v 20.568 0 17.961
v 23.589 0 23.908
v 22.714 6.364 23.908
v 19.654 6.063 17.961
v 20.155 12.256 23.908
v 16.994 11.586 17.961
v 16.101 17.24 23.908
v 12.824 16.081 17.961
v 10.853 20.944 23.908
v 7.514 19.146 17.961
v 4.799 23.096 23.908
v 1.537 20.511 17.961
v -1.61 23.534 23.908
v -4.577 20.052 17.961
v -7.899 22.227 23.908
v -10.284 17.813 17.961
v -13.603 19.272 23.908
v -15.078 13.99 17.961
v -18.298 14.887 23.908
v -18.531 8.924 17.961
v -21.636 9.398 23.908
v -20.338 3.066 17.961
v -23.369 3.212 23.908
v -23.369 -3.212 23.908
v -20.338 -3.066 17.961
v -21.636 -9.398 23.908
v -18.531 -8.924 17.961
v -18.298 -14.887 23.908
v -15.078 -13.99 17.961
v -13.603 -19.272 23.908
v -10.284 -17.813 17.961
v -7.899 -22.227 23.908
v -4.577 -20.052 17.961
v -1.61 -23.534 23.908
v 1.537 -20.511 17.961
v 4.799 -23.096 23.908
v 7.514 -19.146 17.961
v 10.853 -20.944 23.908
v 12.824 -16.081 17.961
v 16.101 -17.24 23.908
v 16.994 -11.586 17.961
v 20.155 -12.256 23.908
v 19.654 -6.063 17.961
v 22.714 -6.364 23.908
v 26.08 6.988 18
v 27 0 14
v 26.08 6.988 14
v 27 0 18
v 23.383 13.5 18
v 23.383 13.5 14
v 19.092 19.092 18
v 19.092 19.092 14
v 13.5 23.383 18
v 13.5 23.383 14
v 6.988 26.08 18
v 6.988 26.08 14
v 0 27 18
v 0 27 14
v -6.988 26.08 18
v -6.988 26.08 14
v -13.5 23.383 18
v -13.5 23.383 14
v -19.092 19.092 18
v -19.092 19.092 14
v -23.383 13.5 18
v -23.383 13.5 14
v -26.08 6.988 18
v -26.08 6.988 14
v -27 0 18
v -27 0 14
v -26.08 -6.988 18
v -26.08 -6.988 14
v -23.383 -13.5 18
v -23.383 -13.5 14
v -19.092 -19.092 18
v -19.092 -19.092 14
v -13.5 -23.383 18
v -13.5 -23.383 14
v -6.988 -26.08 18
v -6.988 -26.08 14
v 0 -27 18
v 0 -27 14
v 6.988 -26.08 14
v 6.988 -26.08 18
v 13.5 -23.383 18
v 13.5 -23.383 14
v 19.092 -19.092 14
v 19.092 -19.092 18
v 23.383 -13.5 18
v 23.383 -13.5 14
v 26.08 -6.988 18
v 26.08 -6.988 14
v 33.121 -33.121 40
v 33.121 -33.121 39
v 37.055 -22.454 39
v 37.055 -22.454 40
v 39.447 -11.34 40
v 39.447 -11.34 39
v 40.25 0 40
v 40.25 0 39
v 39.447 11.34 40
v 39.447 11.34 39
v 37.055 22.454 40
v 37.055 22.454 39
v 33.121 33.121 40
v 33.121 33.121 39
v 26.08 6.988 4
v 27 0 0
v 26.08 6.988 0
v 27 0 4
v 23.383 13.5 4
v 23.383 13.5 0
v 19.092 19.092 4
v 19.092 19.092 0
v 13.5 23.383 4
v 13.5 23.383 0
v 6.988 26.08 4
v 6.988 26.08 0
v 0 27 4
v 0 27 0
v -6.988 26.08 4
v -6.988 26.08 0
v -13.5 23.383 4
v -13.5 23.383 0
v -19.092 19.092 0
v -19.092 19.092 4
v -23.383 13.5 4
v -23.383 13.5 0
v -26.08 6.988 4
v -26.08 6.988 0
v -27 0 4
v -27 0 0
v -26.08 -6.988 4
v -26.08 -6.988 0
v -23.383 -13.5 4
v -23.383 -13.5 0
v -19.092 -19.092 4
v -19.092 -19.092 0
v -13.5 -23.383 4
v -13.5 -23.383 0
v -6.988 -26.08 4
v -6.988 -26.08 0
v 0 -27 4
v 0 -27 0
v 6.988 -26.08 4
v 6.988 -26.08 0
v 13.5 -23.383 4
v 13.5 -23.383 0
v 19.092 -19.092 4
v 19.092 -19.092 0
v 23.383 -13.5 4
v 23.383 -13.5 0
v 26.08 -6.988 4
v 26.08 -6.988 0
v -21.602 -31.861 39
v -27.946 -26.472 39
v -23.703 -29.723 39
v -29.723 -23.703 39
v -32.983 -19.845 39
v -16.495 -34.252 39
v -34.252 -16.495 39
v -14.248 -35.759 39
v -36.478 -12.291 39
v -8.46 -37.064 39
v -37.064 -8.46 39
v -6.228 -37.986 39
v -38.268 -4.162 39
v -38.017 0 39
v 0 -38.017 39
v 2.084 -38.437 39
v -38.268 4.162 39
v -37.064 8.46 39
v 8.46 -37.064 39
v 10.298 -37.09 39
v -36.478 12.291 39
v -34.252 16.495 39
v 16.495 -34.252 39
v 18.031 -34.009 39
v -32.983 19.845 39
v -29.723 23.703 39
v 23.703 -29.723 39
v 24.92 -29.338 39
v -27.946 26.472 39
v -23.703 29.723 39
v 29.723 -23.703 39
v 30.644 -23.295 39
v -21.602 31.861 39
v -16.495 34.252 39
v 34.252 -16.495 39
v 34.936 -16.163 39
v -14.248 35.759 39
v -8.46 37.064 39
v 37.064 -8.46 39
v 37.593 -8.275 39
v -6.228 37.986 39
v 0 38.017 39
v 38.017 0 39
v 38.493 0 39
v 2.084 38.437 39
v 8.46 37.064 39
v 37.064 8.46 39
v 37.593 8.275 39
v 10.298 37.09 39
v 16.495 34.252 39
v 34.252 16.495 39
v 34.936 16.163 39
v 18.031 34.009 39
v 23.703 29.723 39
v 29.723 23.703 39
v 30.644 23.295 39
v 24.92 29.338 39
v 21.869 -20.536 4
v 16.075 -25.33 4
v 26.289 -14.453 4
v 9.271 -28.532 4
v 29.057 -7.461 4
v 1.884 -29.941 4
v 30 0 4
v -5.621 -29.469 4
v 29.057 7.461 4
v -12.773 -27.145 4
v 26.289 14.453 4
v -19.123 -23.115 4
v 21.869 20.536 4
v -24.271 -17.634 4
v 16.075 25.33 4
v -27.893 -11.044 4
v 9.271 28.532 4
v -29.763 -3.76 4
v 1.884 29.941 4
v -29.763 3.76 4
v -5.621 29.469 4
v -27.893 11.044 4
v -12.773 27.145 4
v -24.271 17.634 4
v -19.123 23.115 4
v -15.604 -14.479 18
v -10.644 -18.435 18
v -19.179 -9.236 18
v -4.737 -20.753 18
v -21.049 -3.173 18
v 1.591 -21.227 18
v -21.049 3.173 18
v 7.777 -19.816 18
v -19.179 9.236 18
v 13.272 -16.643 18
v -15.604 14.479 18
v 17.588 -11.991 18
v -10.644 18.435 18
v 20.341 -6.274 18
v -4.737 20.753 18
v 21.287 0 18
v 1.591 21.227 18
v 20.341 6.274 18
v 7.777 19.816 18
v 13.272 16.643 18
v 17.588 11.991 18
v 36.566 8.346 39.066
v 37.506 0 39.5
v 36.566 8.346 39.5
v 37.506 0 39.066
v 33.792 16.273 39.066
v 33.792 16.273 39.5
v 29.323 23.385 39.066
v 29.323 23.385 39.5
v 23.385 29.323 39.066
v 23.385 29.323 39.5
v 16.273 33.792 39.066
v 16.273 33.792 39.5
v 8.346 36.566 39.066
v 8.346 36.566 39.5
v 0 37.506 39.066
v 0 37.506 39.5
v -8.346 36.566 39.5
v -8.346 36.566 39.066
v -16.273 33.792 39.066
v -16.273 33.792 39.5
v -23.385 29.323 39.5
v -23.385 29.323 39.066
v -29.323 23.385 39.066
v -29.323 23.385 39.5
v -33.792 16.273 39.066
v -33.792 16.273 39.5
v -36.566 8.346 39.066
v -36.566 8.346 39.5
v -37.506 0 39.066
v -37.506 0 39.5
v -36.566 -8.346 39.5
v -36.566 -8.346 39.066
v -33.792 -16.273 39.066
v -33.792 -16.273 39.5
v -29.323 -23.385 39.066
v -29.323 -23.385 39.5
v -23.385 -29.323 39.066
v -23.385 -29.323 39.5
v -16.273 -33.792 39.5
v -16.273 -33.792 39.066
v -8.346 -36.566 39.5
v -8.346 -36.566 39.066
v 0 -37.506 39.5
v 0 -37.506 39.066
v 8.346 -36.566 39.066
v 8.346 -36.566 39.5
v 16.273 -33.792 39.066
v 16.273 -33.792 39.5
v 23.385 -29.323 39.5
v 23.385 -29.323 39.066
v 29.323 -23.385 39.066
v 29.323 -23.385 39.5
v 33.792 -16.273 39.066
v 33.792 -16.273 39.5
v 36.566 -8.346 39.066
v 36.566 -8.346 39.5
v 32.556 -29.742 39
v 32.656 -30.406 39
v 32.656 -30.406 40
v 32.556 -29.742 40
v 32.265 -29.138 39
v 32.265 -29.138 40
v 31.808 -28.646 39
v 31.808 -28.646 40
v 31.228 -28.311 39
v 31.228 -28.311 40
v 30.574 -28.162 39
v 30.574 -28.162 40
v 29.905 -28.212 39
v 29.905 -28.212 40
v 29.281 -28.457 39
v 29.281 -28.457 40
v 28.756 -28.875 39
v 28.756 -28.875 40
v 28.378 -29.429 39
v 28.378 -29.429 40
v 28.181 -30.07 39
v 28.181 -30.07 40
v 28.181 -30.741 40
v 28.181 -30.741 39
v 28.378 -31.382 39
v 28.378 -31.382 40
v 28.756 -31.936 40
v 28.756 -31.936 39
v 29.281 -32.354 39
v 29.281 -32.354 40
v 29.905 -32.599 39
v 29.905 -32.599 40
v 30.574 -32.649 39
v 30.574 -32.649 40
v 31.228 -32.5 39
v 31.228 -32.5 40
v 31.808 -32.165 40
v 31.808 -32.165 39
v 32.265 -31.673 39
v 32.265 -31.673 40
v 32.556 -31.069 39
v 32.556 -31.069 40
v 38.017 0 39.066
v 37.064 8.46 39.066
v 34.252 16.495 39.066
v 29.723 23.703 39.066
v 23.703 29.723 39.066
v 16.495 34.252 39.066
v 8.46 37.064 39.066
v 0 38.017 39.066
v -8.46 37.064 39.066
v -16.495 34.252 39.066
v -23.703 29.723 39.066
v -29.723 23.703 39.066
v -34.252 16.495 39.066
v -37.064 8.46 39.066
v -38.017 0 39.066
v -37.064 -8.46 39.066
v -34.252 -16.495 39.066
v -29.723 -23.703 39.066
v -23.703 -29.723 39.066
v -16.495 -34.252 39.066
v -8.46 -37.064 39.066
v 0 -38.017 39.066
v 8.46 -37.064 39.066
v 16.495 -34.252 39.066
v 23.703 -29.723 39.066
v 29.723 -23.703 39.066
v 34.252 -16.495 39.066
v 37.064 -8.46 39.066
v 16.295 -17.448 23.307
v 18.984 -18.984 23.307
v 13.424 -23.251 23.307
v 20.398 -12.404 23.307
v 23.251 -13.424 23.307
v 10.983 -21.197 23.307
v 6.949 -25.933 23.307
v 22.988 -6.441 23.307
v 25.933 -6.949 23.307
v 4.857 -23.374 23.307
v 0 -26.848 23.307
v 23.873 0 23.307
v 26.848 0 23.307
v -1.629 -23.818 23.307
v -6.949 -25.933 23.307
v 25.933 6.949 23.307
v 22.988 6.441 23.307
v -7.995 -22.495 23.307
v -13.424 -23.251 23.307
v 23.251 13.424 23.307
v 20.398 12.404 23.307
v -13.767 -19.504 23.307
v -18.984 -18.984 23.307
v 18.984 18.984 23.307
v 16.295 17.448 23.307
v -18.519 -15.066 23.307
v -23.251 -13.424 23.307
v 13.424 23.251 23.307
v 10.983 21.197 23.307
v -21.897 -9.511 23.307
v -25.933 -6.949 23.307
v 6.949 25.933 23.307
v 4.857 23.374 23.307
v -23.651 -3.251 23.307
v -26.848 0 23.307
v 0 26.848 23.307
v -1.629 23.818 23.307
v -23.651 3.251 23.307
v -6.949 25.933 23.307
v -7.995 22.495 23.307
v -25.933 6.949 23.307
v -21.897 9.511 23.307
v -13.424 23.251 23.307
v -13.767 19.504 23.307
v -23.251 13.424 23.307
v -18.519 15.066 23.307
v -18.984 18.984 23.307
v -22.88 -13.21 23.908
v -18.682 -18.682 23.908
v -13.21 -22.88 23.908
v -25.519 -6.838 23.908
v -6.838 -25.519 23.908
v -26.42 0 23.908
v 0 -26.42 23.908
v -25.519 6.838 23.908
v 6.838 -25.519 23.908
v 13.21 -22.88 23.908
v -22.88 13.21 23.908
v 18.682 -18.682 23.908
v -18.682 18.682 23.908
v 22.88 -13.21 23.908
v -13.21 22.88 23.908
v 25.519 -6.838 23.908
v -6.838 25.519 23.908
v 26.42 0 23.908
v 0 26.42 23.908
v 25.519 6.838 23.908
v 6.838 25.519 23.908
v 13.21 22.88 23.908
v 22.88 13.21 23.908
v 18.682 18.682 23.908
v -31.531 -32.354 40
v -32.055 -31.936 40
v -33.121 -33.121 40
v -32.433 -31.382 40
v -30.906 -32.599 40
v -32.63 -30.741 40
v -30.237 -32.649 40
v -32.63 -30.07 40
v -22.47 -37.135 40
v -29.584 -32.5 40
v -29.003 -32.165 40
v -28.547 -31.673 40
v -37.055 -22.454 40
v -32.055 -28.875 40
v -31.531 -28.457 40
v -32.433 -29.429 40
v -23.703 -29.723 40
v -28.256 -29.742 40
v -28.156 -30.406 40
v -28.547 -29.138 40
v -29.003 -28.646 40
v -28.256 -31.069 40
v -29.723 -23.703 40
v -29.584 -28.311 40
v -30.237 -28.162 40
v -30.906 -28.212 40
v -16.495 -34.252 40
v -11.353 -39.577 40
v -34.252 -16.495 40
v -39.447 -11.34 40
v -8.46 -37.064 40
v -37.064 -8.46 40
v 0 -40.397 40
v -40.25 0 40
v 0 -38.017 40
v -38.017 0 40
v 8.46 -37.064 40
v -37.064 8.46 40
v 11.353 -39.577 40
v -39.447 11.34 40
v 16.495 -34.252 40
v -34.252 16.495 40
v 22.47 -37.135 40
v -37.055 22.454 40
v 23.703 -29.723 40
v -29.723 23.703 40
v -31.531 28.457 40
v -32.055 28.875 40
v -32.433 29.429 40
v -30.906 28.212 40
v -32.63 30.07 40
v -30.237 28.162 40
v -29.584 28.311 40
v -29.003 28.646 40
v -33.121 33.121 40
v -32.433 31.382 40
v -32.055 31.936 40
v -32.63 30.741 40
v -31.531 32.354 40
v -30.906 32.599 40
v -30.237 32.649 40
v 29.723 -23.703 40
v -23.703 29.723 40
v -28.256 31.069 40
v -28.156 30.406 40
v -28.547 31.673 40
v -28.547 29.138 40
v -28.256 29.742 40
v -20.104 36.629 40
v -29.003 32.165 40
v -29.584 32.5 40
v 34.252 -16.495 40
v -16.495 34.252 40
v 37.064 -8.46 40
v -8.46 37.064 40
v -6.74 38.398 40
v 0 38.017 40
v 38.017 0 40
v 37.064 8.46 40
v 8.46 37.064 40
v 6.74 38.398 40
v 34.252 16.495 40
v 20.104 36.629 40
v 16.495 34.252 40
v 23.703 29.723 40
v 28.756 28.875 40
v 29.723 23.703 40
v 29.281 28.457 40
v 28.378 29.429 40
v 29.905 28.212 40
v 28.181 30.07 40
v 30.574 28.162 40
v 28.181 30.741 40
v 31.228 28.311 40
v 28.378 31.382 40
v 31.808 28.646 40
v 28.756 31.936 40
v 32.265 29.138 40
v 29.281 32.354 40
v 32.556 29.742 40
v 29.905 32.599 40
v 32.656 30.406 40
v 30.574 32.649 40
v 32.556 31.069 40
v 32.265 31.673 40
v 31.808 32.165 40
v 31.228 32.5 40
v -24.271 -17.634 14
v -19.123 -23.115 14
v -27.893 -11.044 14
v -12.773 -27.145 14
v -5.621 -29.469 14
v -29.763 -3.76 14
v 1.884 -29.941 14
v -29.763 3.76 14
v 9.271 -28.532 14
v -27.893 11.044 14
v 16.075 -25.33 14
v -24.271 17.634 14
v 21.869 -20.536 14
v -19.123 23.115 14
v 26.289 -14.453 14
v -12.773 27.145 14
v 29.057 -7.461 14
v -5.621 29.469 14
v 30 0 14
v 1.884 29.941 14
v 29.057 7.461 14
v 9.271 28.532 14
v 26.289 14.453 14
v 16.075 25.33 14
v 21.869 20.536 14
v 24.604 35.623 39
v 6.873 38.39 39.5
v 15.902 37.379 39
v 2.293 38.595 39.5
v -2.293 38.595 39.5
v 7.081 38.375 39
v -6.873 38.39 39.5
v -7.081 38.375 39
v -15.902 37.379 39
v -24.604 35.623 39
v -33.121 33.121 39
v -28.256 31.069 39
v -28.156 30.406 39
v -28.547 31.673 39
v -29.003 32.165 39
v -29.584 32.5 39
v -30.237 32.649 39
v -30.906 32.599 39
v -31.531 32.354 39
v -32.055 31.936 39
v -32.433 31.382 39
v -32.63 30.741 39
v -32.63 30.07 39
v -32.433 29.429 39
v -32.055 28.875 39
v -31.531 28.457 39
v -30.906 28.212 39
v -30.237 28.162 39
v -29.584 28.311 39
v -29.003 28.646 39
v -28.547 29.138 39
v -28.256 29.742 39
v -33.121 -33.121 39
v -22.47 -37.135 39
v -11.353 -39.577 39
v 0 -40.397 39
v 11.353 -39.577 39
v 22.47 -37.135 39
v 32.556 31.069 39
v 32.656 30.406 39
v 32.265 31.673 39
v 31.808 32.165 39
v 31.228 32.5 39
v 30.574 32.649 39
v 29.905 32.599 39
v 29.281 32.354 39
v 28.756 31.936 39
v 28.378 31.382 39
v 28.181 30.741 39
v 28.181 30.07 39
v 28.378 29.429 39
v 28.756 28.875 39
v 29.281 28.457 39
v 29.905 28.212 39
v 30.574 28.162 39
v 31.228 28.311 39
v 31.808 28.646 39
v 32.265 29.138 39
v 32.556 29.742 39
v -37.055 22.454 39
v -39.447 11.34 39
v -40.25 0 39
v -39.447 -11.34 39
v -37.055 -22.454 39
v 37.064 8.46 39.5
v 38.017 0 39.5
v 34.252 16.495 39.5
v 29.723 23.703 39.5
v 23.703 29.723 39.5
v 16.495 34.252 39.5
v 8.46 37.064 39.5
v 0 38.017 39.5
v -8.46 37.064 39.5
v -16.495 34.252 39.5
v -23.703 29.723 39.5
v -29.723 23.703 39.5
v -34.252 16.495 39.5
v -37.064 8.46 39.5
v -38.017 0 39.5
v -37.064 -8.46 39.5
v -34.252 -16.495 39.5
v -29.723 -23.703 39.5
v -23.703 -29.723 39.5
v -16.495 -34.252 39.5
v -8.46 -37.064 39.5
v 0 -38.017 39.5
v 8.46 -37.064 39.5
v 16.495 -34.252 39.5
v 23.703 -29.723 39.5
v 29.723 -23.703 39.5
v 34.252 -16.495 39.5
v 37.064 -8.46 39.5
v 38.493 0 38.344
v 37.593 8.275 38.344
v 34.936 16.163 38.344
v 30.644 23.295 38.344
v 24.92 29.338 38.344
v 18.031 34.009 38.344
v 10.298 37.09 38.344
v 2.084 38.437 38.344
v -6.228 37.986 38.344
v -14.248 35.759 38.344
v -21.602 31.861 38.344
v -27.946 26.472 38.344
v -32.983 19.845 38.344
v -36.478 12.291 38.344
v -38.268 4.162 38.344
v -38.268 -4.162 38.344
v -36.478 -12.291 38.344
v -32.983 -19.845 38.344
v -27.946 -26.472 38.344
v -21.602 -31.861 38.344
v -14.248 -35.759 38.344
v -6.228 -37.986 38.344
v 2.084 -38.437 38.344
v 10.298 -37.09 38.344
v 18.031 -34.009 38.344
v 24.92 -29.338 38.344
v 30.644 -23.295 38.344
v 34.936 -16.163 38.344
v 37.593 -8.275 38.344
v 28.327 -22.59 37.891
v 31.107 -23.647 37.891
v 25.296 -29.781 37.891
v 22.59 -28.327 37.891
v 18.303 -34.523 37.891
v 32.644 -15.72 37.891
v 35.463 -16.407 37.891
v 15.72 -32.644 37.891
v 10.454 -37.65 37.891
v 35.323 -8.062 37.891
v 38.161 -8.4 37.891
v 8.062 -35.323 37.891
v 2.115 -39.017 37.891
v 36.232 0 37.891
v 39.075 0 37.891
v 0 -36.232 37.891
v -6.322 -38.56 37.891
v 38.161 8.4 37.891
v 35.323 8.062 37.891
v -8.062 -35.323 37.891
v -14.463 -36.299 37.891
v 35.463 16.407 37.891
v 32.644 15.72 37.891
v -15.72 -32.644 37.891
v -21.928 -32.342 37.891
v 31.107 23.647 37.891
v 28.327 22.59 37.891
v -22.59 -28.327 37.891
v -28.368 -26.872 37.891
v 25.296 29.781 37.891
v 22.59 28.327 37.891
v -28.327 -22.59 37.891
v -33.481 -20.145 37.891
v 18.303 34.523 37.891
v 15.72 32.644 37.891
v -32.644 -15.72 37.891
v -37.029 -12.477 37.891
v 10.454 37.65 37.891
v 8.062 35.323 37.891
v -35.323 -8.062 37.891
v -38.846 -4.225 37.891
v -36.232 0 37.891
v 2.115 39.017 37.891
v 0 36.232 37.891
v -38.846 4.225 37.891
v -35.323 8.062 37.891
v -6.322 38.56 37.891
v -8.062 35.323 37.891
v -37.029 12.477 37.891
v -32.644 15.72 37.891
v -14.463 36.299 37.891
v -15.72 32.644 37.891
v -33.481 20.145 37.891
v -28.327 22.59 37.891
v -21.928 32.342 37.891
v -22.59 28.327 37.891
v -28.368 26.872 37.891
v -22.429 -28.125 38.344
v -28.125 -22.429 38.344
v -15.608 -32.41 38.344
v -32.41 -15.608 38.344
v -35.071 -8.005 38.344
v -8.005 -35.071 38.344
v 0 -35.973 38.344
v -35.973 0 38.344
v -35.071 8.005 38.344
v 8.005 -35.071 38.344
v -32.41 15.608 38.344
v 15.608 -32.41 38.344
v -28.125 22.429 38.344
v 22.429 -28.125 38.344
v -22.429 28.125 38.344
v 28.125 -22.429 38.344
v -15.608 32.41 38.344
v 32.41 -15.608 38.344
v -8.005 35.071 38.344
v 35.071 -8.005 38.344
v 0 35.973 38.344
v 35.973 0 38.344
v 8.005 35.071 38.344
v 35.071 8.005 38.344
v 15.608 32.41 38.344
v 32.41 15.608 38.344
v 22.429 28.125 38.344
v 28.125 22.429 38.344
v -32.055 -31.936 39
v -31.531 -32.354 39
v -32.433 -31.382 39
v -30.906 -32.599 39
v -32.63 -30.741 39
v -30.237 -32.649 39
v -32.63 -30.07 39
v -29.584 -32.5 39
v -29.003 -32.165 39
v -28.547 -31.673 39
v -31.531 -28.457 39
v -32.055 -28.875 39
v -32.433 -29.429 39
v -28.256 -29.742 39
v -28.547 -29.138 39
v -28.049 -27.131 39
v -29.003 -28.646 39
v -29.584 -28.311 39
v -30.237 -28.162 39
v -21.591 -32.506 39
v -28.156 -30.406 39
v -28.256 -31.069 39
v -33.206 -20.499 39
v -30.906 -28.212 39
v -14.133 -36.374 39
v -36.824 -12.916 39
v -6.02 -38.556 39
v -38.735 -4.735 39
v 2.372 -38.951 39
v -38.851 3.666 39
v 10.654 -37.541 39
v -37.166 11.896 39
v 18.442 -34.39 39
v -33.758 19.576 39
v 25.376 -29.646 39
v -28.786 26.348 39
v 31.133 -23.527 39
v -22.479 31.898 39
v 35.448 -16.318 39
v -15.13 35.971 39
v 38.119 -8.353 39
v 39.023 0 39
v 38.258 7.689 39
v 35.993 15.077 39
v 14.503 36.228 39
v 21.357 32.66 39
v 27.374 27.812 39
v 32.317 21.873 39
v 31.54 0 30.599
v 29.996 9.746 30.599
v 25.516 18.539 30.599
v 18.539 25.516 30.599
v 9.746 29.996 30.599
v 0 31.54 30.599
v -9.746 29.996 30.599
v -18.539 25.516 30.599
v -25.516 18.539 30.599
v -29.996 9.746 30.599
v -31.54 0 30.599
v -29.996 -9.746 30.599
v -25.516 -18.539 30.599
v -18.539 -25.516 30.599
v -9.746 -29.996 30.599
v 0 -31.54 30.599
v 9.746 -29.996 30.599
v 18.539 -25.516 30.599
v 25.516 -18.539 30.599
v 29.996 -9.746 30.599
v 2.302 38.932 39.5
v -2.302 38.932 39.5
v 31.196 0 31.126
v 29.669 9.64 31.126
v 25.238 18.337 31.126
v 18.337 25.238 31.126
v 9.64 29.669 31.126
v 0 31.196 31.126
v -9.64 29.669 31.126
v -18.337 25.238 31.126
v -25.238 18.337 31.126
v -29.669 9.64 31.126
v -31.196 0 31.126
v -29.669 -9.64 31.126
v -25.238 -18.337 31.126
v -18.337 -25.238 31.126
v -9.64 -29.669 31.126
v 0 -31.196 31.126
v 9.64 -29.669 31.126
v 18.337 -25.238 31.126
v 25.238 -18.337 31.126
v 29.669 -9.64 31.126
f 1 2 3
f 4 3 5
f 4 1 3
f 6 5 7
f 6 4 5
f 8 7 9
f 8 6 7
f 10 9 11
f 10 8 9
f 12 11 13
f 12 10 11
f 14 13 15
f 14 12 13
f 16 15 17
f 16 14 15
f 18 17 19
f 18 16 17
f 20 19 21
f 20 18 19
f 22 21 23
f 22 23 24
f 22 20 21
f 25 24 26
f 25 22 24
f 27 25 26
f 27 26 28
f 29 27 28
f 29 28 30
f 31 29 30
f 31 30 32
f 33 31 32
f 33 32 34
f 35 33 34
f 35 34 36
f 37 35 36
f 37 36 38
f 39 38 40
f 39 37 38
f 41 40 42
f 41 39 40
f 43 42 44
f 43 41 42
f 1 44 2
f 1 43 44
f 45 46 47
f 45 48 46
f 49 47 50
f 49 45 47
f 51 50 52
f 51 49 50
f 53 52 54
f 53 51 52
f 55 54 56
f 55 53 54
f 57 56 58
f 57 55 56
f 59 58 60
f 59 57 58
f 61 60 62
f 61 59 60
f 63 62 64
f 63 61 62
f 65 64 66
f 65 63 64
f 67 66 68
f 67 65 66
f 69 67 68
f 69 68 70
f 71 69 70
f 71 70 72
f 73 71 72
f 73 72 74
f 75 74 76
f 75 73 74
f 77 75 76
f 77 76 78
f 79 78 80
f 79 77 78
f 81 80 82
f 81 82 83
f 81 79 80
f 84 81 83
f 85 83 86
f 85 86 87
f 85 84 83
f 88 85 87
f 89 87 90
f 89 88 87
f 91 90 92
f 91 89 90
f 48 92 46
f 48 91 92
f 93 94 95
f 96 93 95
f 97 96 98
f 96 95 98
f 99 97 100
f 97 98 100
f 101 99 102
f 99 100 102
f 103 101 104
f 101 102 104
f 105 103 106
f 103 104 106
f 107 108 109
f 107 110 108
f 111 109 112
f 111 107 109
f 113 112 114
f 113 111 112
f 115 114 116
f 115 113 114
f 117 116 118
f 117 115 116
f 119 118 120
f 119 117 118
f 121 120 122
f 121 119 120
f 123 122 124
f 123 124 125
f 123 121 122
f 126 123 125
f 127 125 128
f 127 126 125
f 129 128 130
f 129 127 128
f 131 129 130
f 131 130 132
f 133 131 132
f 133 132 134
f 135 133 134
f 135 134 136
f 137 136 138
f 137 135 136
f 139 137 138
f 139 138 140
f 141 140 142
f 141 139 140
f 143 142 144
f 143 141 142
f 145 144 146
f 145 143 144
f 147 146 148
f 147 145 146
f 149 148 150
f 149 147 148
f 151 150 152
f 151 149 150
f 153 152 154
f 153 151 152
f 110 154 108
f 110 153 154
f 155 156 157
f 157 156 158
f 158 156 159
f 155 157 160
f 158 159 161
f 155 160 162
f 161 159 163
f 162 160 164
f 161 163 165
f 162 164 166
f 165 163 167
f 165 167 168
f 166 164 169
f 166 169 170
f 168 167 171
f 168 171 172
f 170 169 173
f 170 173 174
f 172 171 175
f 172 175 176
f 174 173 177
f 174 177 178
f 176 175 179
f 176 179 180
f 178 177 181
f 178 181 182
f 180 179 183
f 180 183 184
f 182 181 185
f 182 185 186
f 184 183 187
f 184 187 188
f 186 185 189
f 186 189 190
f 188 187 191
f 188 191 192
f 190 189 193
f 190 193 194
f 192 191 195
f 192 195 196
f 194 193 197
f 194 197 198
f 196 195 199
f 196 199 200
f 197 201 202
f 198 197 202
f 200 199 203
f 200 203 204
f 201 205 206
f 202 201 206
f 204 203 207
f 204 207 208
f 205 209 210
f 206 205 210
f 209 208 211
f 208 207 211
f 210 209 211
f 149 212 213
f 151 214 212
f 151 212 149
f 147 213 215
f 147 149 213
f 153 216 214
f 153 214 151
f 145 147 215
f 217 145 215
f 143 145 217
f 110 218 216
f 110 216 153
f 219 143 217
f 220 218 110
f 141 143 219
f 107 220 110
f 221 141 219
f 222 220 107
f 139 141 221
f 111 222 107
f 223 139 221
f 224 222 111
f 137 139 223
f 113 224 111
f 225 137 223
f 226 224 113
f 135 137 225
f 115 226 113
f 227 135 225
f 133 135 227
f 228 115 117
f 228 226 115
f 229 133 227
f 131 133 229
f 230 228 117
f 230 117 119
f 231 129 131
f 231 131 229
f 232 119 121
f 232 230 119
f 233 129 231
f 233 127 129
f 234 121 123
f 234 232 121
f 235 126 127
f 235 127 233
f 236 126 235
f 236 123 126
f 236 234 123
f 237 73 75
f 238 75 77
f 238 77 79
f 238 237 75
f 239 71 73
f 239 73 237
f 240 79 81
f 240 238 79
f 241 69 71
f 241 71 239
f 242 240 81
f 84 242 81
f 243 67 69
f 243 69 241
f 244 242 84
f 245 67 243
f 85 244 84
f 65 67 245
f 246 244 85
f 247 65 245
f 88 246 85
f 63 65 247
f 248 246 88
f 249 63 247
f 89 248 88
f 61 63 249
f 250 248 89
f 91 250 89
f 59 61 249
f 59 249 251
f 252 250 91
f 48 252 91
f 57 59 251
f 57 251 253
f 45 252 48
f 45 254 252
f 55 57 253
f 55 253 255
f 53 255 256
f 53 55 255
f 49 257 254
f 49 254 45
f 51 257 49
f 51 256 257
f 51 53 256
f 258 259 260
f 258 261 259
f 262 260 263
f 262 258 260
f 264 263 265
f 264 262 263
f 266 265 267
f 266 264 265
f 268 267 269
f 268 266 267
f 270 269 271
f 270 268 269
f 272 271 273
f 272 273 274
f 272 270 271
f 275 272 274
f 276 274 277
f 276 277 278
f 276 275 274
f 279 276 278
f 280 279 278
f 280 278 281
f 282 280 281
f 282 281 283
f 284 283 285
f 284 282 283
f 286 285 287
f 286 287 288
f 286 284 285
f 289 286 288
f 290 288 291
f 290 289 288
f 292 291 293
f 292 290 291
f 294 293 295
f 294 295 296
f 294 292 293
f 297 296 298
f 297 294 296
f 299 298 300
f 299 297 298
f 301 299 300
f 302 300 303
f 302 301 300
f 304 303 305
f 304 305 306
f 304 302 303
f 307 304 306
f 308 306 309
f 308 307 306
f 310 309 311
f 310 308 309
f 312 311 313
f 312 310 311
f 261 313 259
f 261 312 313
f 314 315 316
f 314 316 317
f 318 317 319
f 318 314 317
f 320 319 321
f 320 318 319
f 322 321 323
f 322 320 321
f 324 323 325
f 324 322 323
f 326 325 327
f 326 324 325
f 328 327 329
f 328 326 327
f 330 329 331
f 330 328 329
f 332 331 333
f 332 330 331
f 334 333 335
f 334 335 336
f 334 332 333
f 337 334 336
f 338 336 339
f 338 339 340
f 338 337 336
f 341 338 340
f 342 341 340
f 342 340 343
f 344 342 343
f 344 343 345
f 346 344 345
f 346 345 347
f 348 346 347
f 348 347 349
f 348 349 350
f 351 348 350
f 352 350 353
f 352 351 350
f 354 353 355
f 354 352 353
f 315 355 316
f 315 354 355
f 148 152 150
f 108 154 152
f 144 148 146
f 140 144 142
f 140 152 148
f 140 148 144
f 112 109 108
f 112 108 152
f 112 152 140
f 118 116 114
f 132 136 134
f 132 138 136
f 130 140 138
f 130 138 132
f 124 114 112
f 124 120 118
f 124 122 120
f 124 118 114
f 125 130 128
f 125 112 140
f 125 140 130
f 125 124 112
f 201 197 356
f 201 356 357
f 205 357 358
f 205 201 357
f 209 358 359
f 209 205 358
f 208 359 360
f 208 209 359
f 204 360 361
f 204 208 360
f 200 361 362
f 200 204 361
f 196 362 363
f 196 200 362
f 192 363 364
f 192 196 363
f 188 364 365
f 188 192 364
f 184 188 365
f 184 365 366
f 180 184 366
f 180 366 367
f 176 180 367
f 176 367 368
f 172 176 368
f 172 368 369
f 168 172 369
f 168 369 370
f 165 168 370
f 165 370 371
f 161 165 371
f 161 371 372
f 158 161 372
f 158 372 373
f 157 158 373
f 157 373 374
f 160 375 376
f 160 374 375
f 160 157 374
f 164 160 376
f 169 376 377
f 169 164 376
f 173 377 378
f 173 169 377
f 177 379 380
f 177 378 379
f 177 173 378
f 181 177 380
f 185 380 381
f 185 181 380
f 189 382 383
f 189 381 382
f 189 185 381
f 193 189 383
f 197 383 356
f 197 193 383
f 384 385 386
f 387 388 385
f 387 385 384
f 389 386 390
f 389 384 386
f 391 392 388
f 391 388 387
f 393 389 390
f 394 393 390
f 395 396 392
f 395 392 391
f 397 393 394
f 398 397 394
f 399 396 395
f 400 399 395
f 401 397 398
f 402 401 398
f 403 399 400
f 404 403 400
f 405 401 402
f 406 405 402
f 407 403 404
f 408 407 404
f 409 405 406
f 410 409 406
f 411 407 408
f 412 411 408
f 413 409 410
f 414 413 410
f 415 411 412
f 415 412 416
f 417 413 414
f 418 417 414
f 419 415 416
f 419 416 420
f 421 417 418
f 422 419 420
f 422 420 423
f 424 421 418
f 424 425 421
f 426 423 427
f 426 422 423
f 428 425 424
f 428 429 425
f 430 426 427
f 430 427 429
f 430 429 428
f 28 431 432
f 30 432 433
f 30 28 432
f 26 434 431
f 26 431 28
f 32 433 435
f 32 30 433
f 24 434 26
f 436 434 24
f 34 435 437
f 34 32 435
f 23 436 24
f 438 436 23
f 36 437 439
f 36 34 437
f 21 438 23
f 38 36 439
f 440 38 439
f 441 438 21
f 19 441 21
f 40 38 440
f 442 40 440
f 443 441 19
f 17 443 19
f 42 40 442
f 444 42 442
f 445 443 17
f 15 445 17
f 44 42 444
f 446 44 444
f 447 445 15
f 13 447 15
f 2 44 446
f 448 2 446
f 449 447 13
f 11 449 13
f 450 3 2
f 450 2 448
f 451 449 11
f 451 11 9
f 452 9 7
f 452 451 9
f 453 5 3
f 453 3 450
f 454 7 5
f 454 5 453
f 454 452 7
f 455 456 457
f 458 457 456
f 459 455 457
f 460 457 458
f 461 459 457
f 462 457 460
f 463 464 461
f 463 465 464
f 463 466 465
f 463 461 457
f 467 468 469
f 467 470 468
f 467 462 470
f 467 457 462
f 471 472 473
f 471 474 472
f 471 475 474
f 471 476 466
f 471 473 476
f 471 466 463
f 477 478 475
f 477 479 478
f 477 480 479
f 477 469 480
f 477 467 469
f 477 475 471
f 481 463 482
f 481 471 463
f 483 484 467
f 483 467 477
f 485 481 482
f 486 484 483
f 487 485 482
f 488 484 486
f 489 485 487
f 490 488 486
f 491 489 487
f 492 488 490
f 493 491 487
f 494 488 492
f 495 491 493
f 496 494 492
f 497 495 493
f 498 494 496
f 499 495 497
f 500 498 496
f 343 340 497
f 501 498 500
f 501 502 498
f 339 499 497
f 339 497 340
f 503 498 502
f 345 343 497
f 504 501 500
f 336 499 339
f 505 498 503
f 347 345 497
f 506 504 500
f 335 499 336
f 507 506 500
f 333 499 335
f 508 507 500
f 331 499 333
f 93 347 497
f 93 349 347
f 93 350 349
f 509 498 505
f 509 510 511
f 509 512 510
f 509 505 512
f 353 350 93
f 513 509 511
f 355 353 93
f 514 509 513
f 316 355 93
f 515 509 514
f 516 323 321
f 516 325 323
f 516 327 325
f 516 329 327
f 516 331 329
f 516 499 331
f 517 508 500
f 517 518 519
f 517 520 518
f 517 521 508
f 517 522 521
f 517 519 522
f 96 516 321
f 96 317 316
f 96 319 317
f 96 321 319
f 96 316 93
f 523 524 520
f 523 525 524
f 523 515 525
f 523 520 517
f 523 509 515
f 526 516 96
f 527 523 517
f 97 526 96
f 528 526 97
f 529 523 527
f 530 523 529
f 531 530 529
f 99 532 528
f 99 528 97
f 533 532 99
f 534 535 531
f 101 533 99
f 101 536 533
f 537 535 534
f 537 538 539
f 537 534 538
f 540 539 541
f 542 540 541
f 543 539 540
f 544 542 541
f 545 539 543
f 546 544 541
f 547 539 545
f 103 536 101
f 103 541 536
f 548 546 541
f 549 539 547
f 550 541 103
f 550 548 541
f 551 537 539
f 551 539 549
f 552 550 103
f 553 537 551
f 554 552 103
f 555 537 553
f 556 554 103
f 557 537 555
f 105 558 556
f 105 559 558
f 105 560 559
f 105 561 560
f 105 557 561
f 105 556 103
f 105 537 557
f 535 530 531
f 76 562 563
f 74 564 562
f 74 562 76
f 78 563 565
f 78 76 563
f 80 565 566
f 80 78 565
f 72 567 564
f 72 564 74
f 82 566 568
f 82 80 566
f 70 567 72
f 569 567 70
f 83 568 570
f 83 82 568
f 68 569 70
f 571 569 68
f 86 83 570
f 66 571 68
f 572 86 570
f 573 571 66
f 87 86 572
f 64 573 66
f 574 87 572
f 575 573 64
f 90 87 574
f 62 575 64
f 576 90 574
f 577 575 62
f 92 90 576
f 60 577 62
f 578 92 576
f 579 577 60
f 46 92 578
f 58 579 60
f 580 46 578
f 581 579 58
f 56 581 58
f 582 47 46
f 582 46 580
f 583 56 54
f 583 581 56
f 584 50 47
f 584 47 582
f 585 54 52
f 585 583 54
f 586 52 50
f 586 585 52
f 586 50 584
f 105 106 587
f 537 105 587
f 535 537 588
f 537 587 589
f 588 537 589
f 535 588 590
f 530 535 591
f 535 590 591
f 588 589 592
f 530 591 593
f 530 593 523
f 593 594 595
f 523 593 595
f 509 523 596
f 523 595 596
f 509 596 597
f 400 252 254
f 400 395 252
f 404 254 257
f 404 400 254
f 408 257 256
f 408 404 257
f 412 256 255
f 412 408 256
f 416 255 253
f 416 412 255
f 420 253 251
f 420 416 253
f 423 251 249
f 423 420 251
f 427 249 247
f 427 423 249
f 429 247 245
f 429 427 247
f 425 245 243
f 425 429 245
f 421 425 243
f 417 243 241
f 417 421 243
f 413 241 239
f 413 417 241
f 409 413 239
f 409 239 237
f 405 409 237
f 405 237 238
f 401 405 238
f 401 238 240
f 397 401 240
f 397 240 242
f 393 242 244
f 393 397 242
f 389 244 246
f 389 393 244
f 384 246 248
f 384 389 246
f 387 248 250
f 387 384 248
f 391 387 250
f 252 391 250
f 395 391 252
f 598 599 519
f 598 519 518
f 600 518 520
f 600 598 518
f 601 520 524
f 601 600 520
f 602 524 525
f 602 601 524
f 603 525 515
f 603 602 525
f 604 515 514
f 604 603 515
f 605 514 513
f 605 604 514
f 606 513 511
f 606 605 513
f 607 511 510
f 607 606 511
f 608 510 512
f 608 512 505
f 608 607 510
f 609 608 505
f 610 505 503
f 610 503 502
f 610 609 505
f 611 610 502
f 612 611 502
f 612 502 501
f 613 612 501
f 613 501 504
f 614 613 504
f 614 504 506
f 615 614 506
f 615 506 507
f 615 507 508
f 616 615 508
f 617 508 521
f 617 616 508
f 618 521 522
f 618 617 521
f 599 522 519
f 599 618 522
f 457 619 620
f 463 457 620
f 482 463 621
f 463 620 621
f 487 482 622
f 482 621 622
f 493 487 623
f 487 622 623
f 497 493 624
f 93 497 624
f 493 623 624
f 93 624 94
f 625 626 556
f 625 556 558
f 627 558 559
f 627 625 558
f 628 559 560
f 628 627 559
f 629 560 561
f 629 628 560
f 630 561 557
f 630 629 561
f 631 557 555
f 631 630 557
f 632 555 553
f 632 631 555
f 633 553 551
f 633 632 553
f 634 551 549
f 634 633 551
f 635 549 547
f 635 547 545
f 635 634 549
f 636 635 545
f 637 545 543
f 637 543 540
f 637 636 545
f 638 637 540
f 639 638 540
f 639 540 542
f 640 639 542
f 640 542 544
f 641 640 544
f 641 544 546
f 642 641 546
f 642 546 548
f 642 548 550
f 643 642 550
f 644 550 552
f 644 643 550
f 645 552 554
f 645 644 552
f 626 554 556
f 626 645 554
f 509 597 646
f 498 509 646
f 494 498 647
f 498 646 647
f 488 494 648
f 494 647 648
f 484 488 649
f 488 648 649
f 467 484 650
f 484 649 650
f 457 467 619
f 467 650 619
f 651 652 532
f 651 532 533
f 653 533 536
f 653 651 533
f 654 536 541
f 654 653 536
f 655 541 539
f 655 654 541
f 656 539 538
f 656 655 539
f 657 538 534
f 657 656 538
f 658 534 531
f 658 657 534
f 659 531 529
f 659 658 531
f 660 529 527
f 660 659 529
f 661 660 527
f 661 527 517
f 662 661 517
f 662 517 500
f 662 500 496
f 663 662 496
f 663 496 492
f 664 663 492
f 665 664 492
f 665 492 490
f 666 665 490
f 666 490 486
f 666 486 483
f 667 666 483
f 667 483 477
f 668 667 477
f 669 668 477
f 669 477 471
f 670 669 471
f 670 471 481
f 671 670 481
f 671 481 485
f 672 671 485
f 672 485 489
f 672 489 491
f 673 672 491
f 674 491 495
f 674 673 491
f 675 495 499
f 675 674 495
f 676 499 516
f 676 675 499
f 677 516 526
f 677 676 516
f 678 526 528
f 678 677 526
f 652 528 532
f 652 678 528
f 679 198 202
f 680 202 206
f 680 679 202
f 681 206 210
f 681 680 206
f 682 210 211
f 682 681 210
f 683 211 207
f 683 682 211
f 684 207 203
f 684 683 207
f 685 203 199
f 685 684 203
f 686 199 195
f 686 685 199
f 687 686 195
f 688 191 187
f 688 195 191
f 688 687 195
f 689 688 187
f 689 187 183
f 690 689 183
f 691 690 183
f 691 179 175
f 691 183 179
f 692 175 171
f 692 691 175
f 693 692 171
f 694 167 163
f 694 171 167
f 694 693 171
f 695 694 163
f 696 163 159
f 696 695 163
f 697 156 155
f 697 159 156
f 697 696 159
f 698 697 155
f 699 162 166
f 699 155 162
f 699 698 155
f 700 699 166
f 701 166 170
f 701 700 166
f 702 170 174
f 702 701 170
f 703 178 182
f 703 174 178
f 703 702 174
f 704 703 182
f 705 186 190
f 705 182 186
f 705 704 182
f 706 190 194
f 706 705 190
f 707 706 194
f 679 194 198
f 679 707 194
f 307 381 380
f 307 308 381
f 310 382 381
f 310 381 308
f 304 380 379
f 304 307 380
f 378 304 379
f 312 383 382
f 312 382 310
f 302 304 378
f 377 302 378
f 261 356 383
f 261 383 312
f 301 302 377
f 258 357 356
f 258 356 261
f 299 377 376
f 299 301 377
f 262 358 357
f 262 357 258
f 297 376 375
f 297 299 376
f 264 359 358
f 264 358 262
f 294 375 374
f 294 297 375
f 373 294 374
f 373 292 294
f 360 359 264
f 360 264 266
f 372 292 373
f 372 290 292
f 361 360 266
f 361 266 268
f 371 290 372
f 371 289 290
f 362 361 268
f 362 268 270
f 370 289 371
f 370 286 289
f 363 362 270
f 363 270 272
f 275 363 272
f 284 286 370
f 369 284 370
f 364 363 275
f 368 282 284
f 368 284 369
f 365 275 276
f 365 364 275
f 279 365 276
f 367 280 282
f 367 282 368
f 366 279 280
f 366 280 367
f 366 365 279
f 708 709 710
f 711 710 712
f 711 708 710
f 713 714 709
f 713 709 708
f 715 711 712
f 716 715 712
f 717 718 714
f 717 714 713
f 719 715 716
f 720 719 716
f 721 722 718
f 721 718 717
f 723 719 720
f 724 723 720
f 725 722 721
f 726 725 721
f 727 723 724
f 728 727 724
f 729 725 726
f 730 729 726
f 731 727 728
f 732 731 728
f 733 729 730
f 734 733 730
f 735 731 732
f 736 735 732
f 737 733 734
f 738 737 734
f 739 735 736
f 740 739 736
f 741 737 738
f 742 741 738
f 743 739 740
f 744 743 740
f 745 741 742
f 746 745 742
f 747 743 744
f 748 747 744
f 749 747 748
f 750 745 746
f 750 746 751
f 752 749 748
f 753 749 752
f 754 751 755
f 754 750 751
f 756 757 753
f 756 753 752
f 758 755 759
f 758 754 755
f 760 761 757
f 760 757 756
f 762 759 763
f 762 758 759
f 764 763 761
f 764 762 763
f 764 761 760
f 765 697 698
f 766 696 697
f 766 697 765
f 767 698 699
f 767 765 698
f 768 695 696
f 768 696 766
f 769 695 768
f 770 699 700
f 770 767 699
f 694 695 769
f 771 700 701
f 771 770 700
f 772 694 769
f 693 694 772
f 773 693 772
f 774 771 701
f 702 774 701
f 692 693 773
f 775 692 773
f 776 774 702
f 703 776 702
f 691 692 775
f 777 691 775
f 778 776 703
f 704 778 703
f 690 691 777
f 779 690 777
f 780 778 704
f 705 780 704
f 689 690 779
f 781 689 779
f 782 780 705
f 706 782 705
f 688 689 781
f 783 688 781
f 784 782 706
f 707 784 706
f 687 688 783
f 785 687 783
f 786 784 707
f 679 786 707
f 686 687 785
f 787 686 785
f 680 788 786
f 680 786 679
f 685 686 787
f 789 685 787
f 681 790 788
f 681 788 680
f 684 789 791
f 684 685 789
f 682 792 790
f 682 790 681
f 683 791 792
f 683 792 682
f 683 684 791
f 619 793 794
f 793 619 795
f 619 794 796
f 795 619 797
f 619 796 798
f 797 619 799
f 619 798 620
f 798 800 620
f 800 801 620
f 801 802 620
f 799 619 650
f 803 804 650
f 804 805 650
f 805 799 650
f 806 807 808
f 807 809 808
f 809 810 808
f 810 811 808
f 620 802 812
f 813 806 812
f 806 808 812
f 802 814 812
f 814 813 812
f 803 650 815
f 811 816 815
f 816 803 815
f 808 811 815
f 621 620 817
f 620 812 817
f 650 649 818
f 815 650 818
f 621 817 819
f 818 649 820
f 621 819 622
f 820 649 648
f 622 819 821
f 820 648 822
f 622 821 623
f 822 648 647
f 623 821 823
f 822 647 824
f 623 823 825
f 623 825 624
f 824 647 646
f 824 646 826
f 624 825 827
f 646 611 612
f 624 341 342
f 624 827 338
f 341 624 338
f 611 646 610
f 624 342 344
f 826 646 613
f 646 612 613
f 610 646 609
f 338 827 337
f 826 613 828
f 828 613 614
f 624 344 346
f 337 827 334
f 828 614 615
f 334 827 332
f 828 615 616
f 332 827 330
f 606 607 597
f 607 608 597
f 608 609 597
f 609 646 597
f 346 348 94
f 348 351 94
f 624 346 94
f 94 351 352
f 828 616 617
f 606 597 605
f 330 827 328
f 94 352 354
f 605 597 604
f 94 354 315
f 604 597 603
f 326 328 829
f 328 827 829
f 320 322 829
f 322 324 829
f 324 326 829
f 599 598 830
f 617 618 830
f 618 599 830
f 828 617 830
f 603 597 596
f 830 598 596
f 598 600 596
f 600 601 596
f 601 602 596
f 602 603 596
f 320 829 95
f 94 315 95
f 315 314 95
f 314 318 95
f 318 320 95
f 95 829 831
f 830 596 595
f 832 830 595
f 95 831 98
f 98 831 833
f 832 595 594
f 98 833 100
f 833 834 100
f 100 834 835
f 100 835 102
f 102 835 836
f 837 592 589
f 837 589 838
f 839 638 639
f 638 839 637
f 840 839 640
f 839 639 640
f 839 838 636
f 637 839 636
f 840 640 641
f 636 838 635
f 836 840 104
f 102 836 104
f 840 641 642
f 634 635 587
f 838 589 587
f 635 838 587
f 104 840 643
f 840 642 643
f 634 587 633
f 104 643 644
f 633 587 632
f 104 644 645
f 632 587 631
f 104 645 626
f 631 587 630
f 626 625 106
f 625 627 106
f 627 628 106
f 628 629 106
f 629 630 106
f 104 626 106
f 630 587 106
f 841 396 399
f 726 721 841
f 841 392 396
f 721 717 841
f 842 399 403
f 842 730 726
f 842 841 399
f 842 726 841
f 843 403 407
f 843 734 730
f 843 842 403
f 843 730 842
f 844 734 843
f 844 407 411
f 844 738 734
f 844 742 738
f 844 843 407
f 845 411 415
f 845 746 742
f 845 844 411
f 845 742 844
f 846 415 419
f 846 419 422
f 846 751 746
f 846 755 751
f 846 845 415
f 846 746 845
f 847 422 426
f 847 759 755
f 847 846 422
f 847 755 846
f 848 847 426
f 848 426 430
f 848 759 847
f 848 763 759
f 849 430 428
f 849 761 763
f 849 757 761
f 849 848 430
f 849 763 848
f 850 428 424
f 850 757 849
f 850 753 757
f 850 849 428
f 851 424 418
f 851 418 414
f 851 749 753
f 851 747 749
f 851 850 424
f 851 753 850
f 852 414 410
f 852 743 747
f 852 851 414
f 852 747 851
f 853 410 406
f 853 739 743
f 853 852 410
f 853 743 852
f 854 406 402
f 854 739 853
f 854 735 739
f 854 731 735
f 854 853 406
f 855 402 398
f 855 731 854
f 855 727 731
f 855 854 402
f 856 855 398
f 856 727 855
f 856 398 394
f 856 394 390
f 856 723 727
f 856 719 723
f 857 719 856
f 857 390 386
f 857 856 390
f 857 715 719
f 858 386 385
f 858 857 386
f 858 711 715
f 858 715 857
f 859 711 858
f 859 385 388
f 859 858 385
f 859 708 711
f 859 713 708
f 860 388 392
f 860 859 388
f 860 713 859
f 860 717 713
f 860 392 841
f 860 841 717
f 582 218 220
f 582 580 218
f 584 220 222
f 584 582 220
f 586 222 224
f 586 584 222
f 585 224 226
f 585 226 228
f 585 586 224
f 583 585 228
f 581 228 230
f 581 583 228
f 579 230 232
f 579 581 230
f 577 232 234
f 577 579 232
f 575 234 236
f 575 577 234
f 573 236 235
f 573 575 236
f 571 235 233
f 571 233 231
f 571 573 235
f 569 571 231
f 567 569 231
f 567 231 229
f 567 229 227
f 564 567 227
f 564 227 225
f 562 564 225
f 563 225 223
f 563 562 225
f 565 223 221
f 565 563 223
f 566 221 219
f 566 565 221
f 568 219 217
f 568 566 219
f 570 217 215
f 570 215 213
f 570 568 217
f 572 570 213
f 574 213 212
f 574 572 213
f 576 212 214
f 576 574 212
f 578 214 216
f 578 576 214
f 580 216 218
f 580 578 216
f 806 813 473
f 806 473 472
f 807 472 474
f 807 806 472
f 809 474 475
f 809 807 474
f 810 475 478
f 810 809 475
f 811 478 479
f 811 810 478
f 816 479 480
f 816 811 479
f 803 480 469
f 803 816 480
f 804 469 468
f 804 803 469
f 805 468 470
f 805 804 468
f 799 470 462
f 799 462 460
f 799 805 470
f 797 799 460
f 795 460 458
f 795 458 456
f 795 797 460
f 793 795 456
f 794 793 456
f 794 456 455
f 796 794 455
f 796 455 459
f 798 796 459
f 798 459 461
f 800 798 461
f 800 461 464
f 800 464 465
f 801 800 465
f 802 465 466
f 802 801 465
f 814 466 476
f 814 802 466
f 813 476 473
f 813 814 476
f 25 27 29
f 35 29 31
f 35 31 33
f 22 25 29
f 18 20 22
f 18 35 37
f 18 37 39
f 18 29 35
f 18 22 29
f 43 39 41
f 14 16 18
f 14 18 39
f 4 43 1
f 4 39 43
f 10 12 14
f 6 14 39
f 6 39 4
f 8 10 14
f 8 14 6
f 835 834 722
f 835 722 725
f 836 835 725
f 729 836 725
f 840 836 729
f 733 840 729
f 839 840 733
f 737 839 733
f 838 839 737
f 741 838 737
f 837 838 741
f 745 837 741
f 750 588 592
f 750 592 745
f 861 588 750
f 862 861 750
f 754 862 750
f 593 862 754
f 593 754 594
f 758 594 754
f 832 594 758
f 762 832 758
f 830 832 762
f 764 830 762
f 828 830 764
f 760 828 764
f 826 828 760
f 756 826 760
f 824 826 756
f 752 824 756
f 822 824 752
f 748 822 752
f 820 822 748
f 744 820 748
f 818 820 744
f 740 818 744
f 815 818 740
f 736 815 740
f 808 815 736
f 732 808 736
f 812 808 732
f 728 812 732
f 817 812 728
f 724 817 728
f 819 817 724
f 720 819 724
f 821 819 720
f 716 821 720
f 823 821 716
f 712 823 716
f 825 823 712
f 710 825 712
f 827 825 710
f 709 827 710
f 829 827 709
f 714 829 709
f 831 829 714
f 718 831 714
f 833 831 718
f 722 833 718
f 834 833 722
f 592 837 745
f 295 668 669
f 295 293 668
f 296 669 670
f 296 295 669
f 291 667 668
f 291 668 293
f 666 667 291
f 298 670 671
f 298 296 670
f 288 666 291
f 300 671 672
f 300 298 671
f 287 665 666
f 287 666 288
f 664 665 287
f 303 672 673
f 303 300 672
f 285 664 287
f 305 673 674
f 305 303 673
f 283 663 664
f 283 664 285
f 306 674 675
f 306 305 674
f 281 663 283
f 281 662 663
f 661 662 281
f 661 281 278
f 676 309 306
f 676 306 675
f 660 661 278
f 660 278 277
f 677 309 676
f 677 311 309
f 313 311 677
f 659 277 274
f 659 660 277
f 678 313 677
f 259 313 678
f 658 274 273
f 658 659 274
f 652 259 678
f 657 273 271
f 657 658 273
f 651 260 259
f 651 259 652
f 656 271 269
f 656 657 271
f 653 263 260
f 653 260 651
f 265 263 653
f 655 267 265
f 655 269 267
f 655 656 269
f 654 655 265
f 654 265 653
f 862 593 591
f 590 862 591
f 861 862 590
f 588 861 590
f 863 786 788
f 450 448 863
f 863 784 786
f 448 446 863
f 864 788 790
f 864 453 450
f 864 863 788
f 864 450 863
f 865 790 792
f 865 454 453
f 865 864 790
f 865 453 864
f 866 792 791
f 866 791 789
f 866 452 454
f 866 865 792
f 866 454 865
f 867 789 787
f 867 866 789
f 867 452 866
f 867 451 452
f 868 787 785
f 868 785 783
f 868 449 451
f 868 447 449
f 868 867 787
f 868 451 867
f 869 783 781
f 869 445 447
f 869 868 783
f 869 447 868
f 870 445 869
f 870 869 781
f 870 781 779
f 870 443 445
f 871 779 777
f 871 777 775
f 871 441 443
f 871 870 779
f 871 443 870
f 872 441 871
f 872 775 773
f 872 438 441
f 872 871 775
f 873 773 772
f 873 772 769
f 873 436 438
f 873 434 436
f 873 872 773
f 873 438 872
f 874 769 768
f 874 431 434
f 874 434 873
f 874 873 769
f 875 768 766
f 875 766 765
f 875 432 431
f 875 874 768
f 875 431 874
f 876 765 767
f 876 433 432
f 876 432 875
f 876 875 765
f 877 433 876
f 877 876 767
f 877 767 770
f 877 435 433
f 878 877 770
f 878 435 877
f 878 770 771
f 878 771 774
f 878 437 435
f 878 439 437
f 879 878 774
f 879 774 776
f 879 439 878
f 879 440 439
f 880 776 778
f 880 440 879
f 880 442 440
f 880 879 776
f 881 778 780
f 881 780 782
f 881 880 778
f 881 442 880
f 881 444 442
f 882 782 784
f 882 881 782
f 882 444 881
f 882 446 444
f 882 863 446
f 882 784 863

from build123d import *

# Parameters (mm, degrees)
SKETCH001_R   = 2.25
SKETCH001_R_2 = 38.017291
PAD_DEPTH     = 1


with BuildPart() as part:
    # Sketch → Revolution (revolve)
    with BuildSketch(Plane.XZ):
        Polygon((0, 0), (27, 0), (27, 4), (30, 4), (30, 14), (27, 14), (27, 18), (21.287003, 18), (23.87335, 23.307098), (26.847654, 23.307098), (36.231567, 37.891254), (39.074654, 37.891254), (39, 39.5), (37.505909, 39.5), (37.505909, 39.066467), (38.493389, 39.066467), (38.493389, 38.34399), (35.97266, 38.34399), (26.419674, 23.90789), (23.58906, 23.90789), (20.568153, 17.960899), (0, 17.960899), align=None)
    revolve(axis=Axis((0, 0, 0), (0, 0, 1)))

    # Sketch001 → Pad (new body)
    with BuildSketch(Plane.XY.offset(39)):
        with BuildLine():
            ThreePointArc((33.120745, -33.120745), (40.25, 0), (33.120745, 33.120745))
            ThreePointArc((33.120745, 33.120745), (0, 38.620344), (-33.120745, 33.120745))
            ThreePointArc((-33.120745, 33.120745), (-40.25, 0), (-33.120745, -33.120745))
            ThreePointArc((-33.120745, -33.120745), (0, -40.397171), (33.120745, -33.120745))
        make_face()
        with Locations((-30.405592, 30.405592)):
            Circle(SKETCH001_R, mode=Mode.SUBTRACT)
        with Locations((30.405592, 30.405592)):
            Circle(SKETCH001_R, mode=Mode.SUBTRACT)
        with Locations((30.405592, -30.405592)):
            Circle(SKETCH001_R, mode=Mode.SUBTRACT)
        with Locations((-30.405592, -30.405592)):
            Circle(SKETCH001_R, mode=Mode.SUBTRACT)
        Circle(SKETCH001_R_2, mode=Mode.SUBTRACT)
    extrude(amount=PAD_DEPTH)


solid = part.part
